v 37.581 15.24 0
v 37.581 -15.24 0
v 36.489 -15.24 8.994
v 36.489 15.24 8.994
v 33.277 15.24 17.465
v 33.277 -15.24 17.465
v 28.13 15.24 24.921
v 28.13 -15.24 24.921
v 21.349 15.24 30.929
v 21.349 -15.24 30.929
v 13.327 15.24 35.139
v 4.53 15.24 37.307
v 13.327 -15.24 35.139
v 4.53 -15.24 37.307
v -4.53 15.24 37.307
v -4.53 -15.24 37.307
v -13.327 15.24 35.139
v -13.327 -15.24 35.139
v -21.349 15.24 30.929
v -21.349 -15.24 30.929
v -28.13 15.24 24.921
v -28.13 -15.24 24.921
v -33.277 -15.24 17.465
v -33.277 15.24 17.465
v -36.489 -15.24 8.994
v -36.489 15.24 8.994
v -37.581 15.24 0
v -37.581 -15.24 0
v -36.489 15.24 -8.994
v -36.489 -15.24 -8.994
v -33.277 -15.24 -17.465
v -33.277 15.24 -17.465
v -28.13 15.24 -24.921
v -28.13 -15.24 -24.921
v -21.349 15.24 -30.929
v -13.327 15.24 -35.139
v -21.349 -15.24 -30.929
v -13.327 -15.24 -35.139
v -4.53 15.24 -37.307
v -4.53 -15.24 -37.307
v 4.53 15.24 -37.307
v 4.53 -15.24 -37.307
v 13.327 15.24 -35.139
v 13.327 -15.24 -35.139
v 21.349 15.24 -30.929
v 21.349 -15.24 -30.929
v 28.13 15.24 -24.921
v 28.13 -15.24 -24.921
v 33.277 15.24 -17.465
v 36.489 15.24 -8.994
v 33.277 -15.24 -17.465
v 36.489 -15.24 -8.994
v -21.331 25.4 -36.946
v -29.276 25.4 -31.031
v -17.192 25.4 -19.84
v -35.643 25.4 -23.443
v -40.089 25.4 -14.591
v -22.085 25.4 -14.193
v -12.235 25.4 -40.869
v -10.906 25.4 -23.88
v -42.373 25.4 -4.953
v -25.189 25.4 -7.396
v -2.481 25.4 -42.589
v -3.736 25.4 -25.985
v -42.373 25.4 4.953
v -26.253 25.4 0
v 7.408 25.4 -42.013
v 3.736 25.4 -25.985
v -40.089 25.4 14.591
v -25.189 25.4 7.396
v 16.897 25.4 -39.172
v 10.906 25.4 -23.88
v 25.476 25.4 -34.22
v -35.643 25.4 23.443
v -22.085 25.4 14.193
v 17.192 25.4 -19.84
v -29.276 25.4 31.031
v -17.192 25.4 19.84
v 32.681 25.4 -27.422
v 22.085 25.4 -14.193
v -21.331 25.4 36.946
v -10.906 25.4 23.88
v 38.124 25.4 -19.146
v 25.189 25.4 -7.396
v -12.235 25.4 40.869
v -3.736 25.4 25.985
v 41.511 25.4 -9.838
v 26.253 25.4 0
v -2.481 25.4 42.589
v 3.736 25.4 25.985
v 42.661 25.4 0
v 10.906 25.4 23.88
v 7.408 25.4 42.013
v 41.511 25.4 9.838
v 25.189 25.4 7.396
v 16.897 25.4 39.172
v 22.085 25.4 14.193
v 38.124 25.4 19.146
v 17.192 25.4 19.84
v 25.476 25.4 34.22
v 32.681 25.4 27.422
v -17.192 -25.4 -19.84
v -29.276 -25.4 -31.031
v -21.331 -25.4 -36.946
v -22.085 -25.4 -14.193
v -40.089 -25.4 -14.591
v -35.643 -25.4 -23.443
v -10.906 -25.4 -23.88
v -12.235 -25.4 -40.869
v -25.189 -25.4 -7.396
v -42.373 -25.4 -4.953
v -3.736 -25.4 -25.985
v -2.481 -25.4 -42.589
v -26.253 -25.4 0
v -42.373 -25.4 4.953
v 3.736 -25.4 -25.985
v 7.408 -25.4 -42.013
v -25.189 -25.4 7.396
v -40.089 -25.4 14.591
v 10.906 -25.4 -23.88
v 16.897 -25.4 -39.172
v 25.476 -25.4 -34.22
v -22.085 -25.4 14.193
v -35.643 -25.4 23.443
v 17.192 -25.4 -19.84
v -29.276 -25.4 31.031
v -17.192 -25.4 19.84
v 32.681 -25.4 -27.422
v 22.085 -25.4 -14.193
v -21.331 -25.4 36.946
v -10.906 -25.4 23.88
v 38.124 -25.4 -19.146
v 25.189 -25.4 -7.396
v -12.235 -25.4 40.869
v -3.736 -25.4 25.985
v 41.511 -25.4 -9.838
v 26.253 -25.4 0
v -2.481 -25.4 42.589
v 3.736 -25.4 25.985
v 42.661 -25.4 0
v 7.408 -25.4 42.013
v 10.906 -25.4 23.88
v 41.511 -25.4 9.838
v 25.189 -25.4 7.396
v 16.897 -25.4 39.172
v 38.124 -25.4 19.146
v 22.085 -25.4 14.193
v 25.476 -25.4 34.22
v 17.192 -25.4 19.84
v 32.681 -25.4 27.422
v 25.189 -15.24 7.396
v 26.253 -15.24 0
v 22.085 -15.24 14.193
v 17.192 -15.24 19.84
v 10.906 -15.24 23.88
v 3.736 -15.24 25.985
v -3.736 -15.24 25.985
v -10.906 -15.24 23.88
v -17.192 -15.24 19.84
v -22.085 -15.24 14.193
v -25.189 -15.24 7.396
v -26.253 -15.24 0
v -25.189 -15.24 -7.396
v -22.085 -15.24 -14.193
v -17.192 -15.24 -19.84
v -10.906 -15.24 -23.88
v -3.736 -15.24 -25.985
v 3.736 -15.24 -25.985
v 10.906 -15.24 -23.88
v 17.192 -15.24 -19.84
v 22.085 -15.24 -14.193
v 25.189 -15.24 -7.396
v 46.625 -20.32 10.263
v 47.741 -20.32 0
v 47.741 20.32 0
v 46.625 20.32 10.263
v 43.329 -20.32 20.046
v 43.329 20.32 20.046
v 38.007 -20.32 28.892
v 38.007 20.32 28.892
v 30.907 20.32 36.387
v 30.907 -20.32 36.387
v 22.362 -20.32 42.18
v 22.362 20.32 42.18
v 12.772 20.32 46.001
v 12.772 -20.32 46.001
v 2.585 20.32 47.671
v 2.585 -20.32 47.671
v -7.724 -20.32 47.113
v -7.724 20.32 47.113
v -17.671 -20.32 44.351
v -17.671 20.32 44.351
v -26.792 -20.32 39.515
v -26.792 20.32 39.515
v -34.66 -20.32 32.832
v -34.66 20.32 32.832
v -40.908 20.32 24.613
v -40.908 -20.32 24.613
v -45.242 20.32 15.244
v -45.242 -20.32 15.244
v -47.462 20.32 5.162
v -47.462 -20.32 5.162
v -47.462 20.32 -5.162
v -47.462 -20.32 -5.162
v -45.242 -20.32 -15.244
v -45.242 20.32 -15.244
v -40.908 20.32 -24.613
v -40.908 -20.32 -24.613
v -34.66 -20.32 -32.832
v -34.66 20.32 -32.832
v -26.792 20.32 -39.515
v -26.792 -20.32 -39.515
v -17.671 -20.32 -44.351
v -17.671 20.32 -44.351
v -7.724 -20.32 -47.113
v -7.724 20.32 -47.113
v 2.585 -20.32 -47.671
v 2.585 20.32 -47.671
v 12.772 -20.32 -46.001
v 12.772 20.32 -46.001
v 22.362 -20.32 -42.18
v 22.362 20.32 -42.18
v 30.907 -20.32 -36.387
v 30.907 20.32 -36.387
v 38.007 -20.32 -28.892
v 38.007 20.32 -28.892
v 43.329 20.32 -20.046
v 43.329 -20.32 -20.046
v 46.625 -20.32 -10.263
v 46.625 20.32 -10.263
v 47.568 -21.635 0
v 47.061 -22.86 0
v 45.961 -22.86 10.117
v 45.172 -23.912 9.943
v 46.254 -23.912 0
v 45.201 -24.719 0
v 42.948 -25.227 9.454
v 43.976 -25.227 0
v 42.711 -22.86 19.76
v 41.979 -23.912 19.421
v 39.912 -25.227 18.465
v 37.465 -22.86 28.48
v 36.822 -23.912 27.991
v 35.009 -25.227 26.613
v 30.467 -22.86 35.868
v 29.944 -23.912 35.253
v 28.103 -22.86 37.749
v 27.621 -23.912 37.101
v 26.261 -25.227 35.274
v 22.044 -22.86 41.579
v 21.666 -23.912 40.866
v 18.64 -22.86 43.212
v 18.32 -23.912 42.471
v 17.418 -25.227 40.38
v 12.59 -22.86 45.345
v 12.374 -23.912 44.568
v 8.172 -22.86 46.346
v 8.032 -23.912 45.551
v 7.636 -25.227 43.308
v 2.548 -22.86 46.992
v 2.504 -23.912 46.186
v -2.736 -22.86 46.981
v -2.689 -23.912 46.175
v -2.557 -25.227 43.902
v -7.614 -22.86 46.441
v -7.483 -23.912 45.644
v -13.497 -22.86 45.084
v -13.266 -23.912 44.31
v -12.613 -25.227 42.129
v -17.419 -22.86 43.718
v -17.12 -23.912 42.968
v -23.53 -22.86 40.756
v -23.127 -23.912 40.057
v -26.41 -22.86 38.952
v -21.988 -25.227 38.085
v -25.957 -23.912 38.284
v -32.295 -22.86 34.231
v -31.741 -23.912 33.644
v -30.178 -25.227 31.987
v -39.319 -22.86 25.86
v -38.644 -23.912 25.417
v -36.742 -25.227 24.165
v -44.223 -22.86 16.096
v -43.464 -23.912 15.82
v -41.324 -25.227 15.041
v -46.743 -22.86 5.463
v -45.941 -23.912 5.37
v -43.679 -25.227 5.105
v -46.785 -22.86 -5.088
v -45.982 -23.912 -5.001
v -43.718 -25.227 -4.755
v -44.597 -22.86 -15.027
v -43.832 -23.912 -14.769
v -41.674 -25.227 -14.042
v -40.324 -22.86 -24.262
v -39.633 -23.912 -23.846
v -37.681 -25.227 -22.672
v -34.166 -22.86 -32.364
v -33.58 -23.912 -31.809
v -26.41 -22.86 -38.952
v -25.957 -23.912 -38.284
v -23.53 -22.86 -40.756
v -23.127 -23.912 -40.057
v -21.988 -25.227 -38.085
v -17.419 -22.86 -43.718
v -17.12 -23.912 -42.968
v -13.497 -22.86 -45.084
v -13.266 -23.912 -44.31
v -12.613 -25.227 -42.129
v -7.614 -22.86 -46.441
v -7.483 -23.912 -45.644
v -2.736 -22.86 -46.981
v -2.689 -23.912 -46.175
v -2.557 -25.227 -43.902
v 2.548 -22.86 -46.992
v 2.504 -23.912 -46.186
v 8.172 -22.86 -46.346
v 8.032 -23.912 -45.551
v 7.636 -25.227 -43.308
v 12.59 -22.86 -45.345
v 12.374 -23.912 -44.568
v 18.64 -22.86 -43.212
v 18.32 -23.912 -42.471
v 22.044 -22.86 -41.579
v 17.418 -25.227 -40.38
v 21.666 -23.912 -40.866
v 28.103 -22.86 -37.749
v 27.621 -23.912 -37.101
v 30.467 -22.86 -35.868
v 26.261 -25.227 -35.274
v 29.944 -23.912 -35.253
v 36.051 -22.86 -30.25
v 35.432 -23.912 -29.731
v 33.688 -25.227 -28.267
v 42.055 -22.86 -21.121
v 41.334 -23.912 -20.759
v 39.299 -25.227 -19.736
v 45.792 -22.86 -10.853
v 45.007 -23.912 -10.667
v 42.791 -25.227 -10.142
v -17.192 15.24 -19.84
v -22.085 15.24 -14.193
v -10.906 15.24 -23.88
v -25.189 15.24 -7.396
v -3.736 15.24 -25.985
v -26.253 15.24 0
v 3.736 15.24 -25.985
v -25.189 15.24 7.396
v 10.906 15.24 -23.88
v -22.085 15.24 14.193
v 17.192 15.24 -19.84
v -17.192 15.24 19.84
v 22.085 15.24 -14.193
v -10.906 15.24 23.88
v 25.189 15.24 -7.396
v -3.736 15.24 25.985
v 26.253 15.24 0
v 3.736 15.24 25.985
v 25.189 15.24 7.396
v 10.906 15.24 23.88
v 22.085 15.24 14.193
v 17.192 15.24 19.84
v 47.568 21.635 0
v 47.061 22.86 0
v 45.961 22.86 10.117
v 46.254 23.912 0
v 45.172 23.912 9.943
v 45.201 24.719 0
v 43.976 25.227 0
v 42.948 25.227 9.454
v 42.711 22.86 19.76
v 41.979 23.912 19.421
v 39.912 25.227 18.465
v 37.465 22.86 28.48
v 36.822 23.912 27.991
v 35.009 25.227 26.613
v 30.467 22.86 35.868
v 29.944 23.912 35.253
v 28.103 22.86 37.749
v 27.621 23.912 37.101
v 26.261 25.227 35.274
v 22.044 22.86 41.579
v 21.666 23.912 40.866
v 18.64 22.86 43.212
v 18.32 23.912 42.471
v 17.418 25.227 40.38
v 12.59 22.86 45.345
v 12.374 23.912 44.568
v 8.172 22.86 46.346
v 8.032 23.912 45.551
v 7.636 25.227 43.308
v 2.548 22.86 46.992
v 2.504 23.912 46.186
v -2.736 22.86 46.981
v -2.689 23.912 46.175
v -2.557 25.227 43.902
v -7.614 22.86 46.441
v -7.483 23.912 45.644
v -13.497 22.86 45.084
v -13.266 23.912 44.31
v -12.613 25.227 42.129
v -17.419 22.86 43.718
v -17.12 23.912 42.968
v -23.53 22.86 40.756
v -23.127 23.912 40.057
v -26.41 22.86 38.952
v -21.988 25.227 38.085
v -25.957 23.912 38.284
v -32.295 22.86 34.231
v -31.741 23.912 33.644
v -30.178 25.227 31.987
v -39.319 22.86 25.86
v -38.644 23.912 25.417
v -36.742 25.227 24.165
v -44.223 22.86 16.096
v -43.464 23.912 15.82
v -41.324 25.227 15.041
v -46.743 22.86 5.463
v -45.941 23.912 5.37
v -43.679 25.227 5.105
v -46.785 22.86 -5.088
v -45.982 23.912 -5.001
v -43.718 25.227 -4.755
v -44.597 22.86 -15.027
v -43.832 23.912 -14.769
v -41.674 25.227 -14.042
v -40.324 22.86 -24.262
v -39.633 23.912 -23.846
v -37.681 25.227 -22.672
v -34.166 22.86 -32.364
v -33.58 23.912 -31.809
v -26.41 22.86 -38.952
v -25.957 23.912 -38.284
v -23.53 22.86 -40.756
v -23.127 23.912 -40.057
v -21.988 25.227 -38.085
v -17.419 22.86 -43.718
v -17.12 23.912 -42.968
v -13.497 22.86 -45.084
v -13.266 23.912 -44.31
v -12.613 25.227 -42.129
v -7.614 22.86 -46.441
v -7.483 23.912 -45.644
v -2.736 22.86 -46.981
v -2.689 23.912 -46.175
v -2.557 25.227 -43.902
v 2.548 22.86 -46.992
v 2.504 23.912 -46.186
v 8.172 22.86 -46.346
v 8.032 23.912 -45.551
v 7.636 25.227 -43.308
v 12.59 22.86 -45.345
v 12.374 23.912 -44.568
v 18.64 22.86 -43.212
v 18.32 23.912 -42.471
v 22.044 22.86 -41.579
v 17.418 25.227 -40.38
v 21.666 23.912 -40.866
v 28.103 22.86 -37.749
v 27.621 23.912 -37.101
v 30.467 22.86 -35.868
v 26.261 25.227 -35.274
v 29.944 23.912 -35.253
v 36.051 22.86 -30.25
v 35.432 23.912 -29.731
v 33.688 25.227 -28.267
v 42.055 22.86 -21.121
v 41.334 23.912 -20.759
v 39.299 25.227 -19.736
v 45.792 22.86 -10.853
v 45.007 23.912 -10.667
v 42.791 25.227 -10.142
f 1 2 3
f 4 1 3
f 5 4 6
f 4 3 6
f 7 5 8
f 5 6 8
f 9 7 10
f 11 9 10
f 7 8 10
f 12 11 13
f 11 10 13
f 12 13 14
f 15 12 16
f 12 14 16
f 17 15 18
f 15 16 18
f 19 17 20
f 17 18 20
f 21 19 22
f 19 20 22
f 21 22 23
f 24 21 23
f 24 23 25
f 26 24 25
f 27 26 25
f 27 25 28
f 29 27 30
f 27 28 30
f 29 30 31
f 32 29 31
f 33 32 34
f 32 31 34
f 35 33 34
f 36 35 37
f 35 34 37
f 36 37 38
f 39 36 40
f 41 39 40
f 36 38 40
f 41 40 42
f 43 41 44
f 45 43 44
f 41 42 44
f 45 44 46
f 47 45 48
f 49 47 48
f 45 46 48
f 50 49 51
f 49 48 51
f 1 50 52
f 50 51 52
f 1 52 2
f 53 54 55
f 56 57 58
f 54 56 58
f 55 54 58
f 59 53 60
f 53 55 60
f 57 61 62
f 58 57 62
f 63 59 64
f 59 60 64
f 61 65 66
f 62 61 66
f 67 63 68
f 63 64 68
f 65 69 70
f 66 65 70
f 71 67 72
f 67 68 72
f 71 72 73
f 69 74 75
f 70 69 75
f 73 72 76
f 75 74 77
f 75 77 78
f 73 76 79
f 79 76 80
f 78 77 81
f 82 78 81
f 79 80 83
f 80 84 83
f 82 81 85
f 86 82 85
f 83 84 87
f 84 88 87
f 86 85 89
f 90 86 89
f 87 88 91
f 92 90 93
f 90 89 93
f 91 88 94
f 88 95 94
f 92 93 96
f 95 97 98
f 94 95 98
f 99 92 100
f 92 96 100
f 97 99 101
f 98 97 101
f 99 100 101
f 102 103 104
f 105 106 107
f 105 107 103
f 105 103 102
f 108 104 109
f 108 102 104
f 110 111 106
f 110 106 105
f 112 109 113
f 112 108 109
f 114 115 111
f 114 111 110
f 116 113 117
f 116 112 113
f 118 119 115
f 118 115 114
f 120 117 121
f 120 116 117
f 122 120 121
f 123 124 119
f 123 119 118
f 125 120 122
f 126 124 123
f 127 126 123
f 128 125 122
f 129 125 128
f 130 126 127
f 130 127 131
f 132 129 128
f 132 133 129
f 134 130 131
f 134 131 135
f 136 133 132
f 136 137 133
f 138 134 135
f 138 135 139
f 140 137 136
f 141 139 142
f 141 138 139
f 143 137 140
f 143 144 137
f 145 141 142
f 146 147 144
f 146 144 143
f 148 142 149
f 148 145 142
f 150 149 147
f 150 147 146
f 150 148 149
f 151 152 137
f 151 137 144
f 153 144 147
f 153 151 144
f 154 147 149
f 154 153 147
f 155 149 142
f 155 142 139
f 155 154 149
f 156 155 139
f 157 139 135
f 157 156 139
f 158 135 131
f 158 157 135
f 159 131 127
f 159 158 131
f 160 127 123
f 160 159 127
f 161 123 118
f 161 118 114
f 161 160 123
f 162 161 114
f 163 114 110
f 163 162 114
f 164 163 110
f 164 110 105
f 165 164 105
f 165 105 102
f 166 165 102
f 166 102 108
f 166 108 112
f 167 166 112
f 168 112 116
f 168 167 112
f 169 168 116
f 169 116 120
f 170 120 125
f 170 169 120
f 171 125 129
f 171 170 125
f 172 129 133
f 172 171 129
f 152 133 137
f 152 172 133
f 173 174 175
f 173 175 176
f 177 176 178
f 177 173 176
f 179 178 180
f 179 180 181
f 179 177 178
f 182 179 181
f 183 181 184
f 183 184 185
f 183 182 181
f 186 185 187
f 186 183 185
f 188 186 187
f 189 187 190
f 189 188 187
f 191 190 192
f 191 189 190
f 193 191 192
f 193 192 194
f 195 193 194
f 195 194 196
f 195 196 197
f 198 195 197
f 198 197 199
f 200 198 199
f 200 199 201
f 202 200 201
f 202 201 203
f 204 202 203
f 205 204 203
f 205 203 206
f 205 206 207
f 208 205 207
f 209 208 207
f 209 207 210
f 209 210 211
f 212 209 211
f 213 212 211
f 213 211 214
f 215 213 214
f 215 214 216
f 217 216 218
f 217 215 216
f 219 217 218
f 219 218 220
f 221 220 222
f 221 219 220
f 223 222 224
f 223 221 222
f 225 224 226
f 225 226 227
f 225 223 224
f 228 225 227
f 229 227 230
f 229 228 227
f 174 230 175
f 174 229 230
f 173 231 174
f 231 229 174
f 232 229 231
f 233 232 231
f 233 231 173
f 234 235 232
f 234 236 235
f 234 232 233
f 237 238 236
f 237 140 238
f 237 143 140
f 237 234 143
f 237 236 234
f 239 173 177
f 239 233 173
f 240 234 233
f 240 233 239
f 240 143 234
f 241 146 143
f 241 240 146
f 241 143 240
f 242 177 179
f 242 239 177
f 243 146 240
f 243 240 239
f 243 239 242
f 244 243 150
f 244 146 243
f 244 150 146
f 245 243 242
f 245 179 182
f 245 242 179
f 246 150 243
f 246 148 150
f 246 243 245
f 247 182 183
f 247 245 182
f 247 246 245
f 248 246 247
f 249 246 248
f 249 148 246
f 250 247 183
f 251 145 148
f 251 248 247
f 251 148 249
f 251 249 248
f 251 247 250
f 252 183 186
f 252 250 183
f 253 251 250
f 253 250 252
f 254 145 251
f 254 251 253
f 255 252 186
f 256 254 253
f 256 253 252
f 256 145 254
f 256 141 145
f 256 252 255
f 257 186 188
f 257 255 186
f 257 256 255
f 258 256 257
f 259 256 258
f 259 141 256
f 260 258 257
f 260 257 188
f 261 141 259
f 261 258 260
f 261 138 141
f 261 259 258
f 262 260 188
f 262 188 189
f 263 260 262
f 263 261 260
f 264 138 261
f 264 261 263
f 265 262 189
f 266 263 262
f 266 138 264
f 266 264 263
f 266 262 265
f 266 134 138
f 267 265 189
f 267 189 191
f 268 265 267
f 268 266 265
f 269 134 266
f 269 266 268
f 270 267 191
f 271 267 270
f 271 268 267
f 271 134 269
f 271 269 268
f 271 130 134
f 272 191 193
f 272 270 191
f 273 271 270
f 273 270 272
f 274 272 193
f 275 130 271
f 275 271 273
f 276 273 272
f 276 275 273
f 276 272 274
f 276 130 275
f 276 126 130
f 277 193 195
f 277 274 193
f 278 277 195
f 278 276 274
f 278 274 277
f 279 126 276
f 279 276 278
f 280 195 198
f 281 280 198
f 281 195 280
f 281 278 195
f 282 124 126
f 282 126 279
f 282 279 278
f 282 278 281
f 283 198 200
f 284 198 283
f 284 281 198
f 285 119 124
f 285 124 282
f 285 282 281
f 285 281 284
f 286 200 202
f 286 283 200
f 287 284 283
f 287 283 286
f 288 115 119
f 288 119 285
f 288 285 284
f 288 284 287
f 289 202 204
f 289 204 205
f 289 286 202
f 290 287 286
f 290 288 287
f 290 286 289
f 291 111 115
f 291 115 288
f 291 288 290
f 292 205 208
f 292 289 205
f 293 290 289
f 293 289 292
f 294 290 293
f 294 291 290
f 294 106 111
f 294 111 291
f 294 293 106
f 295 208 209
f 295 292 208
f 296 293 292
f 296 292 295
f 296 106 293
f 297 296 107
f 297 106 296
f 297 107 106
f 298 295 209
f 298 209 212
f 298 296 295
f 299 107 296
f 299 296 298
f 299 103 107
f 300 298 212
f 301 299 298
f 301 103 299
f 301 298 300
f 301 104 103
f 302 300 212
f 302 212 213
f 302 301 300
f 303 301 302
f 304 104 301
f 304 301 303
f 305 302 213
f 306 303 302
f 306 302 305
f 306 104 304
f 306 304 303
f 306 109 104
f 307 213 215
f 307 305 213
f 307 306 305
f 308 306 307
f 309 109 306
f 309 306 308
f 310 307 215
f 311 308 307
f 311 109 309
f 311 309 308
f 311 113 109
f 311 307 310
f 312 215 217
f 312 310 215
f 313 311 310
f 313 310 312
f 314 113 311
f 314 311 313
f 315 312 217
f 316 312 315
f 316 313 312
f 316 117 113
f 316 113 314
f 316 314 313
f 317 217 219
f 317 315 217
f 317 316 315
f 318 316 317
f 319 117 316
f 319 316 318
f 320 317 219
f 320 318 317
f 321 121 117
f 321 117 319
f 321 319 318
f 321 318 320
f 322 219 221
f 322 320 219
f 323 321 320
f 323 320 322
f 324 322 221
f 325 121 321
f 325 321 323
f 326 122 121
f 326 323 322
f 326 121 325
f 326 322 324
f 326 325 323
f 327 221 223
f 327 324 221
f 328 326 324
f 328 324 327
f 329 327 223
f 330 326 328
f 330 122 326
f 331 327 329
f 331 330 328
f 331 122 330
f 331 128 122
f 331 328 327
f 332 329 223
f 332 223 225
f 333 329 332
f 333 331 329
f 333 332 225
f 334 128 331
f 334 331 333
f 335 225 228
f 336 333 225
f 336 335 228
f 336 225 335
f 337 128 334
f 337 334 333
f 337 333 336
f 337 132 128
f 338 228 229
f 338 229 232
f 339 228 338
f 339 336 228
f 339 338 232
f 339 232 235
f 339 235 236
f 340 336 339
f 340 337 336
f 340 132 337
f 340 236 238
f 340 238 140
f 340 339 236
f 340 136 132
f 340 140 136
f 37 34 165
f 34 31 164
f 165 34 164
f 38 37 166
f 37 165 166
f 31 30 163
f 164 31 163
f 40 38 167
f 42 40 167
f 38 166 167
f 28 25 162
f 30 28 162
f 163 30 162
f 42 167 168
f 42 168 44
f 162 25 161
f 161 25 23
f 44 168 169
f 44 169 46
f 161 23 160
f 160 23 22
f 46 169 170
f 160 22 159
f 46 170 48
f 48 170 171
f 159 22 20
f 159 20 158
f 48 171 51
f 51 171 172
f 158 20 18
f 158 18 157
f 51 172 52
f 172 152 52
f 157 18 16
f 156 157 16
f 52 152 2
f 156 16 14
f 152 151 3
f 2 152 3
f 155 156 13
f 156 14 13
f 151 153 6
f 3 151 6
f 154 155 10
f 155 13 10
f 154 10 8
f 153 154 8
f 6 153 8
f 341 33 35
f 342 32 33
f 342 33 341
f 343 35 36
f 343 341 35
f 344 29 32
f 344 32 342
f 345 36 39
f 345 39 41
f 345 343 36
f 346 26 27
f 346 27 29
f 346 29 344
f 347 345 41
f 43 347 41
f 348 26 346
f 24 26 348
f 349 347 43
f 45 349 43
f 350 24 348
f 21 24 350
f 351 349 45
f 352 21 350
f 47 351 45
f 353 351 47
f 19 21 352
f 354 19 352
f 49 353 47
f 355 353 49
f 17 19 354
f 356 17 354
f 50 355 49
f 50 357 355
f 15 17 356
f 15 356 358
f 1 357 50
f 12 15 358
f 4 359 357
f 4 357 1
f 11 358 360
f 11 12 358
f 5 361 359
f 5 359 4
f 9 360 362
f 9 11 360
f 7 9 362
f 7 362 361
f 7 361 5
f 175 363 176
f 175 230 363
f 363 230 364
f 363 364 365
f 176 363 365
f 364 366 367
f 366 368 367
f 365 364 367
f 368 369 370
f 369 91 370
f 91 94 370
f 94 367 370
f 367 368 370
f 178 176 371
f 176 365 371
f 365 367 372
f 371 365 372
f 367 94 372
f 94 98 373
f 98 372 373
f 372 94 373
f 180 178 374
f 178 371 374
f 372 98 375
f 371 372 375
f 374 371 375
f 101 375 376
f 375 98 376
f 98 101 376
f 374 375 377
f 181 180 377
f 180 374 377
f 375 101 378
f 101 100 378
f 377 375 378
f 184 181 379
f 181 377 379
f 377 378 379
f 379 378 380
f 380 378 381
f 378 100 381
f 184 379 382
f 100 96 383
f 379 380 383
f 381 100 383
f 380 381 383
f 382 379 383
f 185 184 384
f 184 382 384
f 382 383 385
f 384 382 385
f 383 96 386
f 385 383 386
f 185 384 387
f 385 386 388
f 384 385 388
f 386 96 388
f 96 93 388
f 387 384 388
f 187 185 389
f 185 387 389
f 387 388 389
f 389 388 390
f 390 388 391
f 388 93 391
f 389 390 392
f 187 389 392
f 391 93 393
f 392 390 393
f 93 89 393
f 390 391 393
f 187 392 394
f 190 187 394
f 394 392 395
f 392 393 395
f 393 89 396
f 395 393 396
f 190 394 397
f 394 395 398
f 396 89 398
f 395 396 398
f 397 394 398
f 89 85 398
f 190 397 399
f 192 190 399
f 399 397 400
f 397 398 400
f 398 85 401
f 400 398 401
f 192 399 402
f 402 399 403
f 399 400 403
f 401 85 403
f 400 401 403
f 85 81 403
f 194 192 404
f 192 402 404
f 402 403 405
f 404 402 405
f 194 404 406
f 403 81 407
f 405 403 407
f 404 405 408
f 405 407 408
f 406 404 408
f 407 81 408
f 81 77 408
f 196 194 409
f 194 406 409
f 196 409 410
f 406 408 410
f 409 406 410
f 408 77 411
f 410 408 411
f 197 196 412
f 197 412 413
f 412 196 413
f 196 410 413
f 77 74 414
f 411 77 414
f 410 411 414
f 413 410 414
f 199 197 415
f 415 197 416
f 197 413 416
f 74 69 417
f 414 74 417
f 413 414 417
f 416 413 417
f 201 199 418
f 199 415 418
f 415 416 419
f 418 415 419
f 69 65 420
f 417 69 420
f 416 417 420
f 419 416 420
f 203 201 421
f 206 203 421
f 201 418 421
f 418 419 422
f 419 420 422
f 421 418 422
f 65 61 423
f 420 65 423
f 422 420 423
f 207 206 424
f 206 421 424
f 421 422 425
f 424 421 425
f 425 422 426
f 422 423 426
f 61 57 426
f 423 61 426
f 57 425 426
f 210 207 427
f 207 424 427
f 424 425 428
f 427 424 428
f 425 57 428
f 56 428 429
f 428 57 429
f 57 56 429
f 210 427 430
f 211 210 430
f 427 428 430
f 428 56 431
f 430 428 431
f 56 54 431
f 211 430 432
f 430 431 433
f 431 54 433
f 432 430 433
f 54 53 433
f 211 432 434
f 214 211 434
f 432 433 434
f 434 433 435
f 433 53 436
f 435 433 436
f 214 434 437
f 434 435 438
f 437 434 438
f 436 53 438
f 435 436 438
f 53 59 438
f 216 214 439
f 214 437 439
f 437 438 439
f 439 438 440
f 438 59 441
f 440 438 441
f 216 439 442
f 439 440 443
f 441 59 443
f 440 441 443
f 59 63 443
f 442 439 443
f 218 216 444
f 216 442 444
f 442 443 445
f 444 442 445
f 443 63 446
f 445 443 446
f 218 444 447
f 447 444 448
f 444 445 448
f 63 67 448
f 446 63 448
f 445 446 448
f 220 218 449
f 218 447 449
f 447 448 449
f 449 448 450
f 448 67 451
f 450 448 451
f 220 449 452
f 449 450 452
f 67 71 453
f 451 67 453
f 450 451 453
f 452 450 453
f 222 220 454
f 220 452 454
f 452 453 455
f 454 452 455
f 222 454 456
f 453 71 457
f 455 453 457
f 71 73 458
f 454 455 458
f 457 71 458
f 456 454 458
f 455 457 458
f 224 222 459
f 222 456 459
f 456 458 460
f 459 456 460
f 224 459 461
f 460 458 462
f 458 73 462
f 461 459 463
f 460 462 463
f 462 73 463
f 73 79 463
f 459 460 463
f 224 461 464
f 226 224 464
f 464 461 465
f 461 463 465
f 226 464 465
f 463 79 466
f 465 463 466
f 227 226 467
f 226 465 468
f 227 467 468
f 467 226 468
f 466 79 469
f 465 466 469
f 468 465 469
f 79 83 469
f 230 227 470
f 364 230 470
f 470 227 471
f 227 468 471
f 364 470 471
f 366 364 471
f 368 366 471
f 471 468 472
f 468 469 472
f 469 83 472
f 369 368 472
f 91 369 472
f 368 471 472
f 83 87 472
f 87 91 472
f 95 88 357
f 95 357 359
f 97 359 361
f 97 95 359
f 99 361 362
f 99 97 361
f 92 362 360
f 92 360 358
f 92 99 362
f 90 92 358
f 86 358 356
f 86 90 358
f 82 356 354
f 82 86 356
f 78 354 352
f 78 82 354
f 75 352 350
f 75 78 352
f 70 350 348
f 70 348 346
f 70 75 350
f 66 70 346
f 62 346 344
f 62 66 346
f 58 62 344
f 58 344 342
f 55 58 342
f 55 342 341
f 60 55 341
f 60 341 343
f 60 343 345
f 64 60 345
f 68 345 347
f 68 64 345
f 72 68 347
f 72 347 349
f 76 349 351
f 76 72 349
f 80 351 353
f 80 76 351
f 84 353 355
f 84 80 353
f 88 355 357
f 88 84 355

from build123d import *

# Parameters (mm, degrees)
F0_R     = 47.741436
F0_R_2   = 26.252537
F1_DEPTH = 25.4
F2_R     = 5.08
F3_R     = 5.08
F4_T     = -10.16


with BuildPart() as f1:
    # F0 (on Front) → F1 (new body, symmetric)
    with BuildSketch(Plane.XZ):
        Circle(F0_R)
        Circle(F0_R_2, mode=Mode.SUBTRACT)
    extrude(amount=F1_DEPTH, both=True)

    # F2
    f2_edges = [f1.edges().sort_by_distance(p)[0] for p in [
        (-47.741436, -25.4, 0),
    ]]
    fillet(f2_edges, radius=F2_R)

    # F3
    f3_edges = [f1.edges().sort_by_distance(p)[0] for p in [
        (-47.741436, 25.4, 0),
    ]]
    fillet(f3_edges, radius=F3_R)

    # F4
    f4_openings = [f1.faces().sort_by_distance(p)[0] for p in [
        (-26.252537, 0, 0),
    ]]
    offset(amount=F4_T, openings=f4_openings)


solid = f1.part
